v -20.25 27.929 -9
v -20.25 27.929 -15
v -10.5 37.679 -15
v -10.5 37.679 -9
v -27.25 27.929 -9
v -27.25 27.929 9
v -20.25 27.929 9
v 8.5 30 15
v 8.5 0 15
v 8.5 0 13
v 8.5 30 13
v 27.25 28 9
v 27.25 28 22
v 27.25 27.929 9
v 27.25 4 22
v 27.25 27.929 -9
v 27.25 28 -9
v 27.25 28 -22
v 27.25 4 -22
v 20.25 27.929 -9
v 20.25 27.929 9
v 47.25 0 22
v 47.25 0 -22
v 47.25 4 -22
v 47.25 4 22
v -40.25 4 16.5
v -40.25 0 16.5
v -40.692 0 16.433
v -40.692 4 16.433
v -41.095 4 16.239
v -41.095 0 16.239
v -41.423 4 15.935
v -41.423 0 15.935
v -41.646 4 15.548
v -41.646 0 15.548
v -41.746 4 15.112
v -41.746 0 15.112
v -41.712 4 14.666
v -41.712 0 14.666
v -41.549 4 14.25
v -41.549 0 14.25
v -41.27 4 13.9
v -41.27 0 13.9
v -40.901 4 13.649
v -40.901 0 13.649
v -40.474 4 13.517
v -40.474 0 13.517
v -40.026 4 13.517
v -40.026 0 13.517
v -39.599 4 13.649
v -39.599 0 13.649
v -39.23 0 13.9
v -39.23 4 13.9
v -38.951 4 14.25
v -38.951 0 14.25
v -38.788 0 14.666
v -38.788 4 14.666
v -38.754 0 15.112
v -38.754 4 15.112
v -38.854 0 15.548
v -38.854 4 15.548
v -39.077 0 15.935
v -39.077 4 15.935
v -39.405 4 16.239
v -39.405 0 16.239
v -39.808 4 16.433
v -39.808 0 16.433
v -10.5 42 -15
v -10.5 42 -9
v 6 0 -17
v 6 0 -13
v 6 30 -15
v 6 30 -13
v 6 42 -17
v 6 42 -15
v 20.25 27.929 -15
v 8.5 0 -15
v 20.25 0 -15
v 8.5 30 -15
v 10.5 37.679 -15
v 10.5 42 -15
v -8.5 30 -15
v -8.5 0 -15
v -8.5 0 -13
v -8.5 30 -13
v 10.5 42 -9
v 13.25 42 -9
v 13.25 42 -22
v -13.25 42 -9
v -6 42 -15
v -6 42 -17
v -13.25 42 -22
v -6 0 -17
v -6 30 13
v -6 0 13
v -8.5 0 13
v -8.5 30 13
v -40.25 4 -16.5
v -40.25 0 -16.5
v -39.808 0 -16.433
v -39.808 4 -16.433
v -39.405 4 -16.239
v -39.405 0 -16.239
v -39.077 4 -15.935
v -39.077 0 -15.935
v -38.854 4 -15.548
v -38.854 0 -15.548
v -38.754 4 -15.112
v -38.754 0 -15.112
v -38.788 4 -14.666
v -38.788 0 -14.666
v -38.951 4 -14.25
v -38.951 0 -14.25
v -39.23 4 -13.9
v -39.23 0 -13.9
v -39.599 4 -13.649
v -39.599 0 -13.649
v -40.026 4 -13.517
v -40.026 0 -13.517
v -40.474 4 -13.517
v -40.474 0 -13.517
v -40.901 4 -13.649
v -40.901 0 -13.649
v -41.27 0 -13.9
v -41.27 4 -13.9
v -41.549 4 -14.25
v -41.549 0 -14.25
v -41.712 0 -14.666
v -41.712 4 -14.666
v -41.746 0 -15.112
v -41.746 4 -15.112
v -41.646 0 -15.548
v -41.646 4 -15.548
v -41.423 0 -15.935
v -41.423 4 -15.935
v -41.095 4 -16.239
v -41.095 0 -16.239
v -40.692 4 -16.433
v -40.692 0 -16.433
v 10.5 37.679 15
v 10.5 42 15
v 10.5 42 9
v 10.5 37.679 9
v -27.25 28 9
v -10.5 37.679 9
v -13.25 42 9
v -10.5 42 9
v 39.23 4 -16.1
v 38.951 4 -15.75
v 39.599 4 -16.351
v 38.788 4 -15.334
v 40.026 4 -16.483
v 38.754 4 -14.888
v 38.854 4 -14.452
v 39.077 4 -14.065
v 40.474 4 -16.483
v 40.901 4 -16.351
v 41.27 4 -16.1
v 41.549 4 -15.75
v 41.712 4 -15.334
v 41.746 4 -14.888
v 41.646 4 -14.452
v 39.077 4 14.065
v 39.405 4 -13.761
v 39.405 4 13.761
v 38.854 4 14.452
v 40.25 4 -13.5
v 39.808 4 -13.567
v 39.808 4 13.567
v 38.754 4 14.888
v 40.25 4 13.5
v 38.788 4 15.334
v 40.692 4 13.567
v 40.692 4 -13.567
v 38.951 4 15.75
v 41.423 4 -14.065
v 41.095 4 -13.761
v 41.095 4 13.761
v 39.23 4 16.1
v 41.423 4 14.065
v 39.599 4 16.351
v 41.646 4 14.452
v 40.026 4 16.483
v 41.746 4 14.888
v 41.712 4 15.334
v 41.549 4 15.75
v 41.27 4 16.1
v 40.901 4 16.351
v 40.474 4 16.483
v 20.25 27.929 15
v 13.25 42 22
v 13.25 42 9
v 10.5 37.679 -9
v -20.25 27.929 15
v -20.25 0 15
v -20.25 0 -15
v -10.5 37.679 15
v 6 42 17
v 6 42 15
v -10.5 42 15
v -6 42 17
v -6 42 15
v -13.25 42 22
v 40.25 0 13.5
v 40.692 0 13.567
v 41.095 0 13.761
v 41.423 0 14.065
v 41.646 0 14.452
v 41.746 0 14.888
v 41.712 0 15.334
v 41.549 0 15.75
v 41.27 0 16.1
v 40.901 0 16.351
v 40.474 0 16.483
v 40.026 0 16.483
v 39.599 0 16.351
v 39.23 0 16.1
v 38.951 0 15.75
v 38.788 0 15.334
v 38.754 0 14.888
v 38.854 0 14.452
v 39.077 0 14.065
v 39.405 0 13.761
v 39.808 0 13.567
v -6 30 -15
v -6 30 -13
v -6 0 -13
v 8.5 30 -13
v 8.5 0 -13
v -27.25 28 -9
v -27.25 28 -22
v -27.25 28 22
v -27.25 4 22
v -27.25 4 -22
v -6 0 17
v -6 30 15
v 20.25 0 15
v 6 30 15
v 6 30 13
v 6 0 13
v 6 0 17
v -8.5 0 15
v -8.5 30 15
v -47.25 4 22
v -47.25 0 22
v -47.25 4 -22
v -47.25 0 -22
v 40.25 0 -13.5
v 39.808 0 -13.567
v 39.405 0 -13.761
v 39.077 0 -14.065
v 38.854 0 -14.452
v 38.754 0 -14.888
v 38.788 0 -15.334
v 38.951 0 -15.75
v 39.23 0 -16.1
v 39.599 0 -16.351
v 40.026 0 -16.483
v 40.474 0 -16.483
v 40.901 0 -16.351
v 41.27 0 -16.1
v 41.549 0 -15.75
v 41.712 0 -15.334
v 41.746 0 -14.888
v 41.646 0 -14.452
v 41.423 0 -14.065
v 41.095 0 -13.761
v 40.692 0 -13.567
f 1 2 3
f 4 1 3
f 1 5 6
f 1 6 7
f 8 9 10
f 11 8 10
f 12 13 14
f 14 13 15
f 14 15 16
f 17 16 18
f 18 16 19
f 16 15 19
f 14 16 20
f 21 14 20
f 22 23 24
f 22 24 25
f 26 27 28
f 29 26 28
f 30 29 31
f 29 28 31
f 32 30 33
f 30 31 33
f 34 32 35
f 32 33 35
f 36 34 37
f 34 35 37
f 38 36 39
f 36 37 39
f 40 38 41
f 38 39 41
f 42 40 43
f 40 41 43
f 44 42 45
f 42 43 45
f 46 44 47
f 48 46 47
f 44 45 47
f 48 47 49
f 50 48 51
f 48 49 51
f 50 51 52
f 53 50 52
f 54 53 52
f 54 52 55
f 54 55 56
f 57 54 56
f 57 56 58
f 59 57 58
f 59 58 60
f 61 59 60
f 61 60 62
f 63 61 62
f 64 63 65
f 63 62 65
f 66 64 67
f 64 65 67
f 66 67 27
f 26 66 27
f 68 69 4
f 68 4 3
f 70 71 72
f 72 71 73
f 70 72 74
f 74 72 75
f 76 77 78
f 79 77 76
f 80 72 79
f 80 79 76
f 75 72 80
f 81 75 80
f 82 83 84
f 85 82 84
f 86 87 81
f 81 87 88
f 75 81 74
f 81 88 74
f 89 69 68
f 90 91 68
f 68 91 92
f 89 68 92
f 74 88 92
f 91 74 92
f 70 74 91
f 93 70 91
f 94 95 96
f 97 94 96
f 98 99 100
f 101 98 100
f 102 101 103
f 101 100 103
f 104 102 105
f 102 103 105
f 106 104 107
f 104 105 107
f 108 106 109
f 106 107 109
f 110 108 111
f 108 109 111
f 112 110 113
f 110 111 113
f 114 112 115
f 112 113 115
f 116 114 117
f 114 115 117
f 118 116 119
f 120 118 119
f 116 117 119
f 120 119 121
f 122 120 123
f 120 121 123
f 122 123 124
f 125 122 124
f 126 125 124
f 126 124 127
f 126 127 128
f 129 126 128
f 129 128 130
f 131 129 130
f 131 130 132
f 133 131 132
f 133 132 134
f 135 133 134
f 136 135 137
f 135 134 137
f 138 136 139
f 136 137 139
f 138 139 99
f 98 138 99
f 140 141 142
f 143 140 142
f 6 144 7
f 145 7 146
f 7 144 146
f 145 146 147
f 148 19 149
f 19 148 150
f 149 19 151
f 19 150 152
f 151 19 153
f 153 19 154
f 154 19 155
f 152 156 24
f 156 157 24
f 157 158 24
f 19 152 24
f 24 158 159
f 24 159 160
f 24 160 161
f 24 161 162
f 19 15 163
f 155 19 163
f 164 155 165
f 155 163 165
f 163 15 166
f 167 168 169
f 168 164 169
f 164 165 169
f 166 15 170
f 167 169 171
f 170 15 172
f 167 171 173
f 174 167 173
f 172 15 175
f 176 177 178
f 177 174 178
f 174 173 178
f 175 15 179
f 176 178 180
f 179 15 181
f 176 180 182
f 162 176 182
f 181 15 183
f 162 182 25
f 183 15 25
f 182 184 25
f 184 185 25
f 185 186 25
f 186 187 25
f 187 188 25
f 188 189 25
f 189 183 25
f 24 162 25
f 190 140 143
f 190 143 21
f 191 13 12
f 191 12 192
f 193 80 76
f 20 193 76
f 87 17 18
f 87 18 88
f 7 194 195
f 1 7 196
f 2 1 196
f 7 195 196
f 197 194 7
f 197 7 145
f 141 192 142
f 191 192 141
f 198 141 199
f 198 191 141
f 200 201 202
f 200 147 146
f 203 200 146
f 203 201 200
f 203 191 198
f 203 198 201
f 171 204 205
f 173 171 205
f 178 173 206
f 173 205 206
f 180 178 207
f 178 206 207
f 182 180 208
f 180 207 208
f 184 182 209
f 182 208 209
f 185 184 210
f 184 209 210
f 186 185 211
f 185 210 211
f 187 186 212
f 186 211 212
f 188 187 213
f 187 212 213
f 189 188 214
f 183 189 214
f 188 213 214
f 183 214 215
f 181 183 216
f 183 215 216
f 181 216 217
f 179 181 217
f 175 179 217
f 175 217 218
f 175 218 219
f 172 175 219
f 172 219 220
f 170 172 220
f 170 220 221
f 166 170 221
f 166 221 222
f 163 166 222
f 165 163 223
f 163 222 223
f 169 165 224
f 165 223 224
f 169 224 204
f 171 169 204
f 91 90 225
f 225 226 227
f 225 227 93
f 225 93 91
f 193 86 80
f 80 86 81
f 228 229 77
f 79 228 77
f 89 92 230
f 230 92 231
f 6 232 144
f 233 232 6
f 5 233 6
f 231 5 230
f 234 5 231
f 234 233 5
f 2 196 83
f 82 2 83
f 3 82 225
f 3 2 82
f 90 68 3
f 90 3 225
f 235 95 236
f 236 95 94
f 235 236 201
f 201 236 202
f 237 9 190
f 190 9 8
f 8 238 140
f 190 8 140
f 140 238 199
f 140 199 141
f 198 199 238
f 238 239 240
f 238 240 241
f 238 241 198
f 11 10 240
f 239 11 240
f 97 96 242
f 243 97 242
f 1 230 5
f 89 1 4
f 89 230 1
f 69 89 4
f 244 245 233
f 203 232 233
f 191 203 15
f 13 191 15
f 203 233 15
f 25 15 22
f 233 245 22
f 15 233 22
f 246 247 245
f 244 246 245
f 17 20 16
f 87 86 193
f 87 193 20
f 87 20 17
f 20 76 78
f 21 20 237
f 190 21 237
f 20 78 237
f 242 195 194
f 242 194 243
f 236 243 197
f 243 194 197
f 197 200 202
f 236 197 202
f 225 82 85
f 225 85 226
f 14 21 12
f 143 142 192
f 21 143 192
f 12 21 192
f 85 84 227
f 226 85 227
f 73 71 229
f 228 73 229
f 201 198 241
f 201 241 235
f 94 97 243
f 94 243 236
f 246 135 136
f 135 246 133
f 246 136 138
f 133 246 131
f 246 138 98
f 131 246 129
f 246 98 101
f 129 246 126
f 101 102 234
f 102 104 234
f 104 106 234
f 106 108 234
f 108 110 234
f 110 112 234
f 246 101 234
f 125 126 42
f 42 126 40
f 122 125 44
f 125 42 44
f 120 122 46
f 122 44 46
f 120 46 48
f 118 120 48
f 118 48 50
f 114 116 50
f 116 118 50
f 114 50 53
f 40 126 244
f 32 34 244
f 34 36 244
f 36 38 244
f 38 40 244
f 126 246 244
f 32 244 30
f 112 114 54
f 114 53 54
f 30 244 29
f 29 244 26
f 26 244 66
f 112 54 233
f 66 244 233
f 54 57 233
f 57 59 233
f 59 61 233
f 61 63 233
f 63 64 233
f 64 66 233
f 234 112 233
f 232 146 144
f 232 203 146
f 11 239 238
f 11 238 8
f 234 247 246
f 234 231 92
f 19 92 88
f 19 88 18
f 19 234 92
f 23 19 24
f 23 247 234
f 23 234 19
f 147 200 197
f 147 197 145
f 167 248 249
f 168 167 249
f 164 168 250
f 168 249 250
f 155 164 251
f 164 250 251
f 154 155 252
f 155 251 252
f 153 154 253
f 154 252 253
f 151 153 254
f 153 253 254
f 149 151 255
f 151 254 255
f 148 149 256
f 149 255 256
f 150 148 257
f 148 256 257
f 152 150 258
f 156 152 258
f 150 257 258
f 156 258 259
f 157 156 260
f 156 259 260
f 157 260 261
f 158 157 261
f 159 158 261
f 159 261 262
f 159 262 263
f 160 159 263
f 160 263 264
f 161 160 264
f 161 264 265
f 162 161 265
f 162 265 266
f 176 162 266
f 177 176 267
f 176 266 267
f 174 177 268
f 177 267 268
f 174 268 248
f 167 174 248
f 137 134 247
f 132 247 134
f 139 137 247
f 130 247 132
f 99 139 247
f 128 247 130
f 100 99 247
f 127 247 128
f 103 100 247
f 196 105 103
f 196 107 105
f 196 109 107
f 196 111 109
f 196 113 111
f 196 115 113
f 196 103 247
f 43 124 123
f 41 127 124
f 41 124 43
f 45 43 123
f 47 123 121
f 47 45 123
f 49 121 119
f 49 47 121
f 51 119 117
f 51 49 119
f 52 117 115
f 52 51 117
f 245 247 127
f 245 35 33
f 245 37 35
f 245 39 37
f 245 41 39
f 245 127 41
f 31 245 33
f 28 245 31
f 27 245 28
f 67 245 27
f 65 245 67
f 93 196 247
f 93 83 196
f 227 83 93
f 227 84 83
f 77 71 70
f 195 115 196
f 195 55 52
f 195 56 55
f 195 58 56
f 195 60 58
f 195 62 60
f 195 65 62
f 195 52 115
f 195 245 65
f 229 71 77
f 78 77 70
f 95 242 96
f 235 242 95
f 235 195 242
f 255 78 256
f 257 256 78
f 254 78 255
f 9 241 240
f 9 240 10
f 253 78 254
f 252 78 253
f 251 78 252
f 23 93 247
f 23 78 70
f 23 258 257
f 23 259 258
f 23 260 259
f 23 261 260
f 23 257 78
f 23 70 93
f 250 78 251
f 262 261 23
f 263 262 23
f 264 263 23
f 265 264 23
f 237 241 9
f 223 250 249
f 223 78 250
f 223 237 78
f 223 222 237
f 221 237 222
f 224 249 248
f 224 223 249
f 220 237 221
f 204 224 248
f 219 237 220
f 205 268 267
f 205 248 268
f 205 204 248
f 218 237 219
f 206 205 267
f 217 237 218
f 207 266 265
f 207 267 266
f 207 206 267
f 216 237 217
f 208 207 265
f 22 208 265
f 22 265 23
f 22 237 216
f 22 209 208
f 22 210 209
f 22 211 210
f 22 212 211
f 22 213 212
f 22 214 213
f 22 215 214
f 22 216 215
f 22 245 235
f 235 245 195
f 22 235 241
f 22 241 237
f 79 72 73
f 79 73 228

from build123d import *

# Parameters (mm, degrees)
SKETCH1_W           = 54.5
SKETCH1_H           = 44
BOSS_EXTRUDE1_DEPTH = 42
CHAMFER2_SIZE       = 14
CHAMFER3_SIZE       = 10
CHAMFER3_SIZE_2     = 7.071067812
BOSS_EXTRUDE2_DEPTH = 6
SKETCH4_W           = 20
SKETCH4_H           = 44
SKETCH4_R           = 1.5
BOSS_EXTRUDE3_DEPTH = 4
SKETCH5_W           = 21
SKETCH5_H           = 30
CUT_EXTRUDE1_DEPTH  = 12
SKETCH6_W           = 12
SKETCH6_H           = 42
CUT_EXTRUDE2_DEPTH  = 2


with BuildPart() as part:
    # Sketch1 → Boss-Extrude1 (new body)
    with BuildSketch(Plane(origin=(0, 0, 0), x_dir=(1, 0, 0), z_dir=(0, 1, 0))):
        Rectangle(SKETCH1_W, SKETCH1_H)
        Polygon((-6, 13), (-6, 15), (6, 15), (6, 13), (8.5, 13), (8.5, 15), (20.25, 15), (20.25, -15), (8.5, -15), (8.5, -13), (6, -13), (6, -15), (-6, -15), (-6, -13), (-8.5, -13), (-8.5, -15), (-20.25, -15), (-20.25, 15), (-8.5, 15), (-8.5, 13), align=None, mode=Mode.SUBTRACT)
    extrude(amount=BOSS_EXTRUDE1_DEPTH)

    # Chamfer2
    # the kernel refuses this chamfer: 14 mm, written as the material it takes off along each edge
    with BuildSketch(Plane(origin=(27.25, 42, 58.003561832), x_dir=(0.027495876610586365, -0.9996219169112968, 0), z_dir=(0, 0, -1)), Plane(origin=(-27.25, 42, -58.003561832), x_dir=(-0.027495876610586365, -0.9996219169112968, 0), z_dir=(0, 0, 1))) as chamfer2_piece_1:
        Polygon((CHAMFER2_SIZE * 0.999621916911, CHAMFER2_SIZE * 0.0274958766106), (-CHAMFER2_SIZE * 0.0274958766106, CHAMFER2_SIZE * 0.999621916911), (0, 0), align=None)
    extrude(amount=116.007123663, mode=Mode.SUBTRACT)

    # Chamfer3
    # the kernel refuses this chamfer: 10, 7.071067812 mm, written as the material it takes off along each edge
    with BuildSketch(Plane(origin=(20.25, 35, -15), x_dir=(0.7262819568769621, -0.6873969152643694, 0), z_dir=(0, 0, 1)), Plane(origin=(-20.25, 35, 15), x_dir=(-0.7262819568769624, -0.6873969152643691, 0), z_dir=(0, 0, -1))) as chamfer3_piece_1:
        Polygon((CHAMFER3_SIZE * 0.999621916911, -CHAMFER3_SIZE * 0.0274958766106), (CHAMFER3_SIZE_2 * 0.687396915251, -CHAMFER3_SIZE_2 * 0.726281956863), (0, 0), align=None)
    extrude(amount=30, mode=Mode.SUBTRACT)

    # Sketch2 → Boss-Extrude2 (add)
    with BuildSketch(Plane.XY.offset(-15)):
        Polygon((-27.25, 20.928932188), (-6.178932188, 42), (-13.25, 42), (-27.25, 28), align=None)
        Polygon((13.25, 42), (6.178932188, 42), (27.25, 20.928932188), (27.25, 28), align=None)
    boss_extrude2 = extrude(amount=BOSS_EXTRUDE2_DEPTH)

    # Mirror2: Boss-Extrude2 across plane
    add(boss_extrude2.mirror(Plane.XY))

    # Sketch4 → Boss-Extrude3 (add)
    # profile 1 of 2: a face of its own
    with BuildSketch(Plane.XZ):
        with Locations((37.25, 0)):
            Rectangle(SKETCH4_W, SKETCH4_H)
        with Locations(Location((40.25, 15, 0), (0, 0, 270))):
            Circle(SKETCH4_R, mode=Mode.SUBTRACT)
        with Locations(Location((40.25, -15, 0), (0, 0, 90))):
            Circle(SKETCH4_R, mode=Mode.SUBTRACT)
    # profile 2 of 2: a face of its own
    with BuildSketch(Plane.XZ):
        with Locations((-37.25, 0)):
            Rectangle(SKETCH4_W, SKETCH4_H)
        with Locations(Location((-40.25, -15, 0), (0, 0, 270))):
            Circle(SKETCH4_R, mode=Mode.SUBTRACT)
        with Locations(Location((-40.25, 15, 0), (0, 0, 90))):
            Circle(SKETCH4_R, mode=Mode.SUBTRACT)
    extrude(amount=-BOSS_EXTRUDE3_DEPTH)

    # Sketch5 → Cut-Extrude1 (cut)
    with BuildSketch(Plane(origin=(0, 42, 0), x_dir=(1, 0, 0), z_dir=(0, 1, 0))):
        Rectangle(SKETCH5_W, SKETCH5_H)
    extrude(amount=-CUT_EXTRUDE1_DEPTH, mode=Mode.SUBTRACT)

    # Sketch6 → Cut-Extrude2 (cut)
    with BuildSketch(Plane(origin=(0, 0, 15), x_dir=(-1, 0, 0), z_dir=(0, 0, -1))):
        with Locations((0, 21)):
            Rectangle(SKETCH6_W, SKETCH6_H)
    cut_extrude2 = extrude(amount=-CUT_EXTRUDE2_DEPTH, mode=Mode.SUBTRACT)

    # Mirror3: Cut-Extrude2 across plane
    add(cut_extrude2.mirror(Plane.XY), mode=Mode.SUBTRACT)


solid = part.part
